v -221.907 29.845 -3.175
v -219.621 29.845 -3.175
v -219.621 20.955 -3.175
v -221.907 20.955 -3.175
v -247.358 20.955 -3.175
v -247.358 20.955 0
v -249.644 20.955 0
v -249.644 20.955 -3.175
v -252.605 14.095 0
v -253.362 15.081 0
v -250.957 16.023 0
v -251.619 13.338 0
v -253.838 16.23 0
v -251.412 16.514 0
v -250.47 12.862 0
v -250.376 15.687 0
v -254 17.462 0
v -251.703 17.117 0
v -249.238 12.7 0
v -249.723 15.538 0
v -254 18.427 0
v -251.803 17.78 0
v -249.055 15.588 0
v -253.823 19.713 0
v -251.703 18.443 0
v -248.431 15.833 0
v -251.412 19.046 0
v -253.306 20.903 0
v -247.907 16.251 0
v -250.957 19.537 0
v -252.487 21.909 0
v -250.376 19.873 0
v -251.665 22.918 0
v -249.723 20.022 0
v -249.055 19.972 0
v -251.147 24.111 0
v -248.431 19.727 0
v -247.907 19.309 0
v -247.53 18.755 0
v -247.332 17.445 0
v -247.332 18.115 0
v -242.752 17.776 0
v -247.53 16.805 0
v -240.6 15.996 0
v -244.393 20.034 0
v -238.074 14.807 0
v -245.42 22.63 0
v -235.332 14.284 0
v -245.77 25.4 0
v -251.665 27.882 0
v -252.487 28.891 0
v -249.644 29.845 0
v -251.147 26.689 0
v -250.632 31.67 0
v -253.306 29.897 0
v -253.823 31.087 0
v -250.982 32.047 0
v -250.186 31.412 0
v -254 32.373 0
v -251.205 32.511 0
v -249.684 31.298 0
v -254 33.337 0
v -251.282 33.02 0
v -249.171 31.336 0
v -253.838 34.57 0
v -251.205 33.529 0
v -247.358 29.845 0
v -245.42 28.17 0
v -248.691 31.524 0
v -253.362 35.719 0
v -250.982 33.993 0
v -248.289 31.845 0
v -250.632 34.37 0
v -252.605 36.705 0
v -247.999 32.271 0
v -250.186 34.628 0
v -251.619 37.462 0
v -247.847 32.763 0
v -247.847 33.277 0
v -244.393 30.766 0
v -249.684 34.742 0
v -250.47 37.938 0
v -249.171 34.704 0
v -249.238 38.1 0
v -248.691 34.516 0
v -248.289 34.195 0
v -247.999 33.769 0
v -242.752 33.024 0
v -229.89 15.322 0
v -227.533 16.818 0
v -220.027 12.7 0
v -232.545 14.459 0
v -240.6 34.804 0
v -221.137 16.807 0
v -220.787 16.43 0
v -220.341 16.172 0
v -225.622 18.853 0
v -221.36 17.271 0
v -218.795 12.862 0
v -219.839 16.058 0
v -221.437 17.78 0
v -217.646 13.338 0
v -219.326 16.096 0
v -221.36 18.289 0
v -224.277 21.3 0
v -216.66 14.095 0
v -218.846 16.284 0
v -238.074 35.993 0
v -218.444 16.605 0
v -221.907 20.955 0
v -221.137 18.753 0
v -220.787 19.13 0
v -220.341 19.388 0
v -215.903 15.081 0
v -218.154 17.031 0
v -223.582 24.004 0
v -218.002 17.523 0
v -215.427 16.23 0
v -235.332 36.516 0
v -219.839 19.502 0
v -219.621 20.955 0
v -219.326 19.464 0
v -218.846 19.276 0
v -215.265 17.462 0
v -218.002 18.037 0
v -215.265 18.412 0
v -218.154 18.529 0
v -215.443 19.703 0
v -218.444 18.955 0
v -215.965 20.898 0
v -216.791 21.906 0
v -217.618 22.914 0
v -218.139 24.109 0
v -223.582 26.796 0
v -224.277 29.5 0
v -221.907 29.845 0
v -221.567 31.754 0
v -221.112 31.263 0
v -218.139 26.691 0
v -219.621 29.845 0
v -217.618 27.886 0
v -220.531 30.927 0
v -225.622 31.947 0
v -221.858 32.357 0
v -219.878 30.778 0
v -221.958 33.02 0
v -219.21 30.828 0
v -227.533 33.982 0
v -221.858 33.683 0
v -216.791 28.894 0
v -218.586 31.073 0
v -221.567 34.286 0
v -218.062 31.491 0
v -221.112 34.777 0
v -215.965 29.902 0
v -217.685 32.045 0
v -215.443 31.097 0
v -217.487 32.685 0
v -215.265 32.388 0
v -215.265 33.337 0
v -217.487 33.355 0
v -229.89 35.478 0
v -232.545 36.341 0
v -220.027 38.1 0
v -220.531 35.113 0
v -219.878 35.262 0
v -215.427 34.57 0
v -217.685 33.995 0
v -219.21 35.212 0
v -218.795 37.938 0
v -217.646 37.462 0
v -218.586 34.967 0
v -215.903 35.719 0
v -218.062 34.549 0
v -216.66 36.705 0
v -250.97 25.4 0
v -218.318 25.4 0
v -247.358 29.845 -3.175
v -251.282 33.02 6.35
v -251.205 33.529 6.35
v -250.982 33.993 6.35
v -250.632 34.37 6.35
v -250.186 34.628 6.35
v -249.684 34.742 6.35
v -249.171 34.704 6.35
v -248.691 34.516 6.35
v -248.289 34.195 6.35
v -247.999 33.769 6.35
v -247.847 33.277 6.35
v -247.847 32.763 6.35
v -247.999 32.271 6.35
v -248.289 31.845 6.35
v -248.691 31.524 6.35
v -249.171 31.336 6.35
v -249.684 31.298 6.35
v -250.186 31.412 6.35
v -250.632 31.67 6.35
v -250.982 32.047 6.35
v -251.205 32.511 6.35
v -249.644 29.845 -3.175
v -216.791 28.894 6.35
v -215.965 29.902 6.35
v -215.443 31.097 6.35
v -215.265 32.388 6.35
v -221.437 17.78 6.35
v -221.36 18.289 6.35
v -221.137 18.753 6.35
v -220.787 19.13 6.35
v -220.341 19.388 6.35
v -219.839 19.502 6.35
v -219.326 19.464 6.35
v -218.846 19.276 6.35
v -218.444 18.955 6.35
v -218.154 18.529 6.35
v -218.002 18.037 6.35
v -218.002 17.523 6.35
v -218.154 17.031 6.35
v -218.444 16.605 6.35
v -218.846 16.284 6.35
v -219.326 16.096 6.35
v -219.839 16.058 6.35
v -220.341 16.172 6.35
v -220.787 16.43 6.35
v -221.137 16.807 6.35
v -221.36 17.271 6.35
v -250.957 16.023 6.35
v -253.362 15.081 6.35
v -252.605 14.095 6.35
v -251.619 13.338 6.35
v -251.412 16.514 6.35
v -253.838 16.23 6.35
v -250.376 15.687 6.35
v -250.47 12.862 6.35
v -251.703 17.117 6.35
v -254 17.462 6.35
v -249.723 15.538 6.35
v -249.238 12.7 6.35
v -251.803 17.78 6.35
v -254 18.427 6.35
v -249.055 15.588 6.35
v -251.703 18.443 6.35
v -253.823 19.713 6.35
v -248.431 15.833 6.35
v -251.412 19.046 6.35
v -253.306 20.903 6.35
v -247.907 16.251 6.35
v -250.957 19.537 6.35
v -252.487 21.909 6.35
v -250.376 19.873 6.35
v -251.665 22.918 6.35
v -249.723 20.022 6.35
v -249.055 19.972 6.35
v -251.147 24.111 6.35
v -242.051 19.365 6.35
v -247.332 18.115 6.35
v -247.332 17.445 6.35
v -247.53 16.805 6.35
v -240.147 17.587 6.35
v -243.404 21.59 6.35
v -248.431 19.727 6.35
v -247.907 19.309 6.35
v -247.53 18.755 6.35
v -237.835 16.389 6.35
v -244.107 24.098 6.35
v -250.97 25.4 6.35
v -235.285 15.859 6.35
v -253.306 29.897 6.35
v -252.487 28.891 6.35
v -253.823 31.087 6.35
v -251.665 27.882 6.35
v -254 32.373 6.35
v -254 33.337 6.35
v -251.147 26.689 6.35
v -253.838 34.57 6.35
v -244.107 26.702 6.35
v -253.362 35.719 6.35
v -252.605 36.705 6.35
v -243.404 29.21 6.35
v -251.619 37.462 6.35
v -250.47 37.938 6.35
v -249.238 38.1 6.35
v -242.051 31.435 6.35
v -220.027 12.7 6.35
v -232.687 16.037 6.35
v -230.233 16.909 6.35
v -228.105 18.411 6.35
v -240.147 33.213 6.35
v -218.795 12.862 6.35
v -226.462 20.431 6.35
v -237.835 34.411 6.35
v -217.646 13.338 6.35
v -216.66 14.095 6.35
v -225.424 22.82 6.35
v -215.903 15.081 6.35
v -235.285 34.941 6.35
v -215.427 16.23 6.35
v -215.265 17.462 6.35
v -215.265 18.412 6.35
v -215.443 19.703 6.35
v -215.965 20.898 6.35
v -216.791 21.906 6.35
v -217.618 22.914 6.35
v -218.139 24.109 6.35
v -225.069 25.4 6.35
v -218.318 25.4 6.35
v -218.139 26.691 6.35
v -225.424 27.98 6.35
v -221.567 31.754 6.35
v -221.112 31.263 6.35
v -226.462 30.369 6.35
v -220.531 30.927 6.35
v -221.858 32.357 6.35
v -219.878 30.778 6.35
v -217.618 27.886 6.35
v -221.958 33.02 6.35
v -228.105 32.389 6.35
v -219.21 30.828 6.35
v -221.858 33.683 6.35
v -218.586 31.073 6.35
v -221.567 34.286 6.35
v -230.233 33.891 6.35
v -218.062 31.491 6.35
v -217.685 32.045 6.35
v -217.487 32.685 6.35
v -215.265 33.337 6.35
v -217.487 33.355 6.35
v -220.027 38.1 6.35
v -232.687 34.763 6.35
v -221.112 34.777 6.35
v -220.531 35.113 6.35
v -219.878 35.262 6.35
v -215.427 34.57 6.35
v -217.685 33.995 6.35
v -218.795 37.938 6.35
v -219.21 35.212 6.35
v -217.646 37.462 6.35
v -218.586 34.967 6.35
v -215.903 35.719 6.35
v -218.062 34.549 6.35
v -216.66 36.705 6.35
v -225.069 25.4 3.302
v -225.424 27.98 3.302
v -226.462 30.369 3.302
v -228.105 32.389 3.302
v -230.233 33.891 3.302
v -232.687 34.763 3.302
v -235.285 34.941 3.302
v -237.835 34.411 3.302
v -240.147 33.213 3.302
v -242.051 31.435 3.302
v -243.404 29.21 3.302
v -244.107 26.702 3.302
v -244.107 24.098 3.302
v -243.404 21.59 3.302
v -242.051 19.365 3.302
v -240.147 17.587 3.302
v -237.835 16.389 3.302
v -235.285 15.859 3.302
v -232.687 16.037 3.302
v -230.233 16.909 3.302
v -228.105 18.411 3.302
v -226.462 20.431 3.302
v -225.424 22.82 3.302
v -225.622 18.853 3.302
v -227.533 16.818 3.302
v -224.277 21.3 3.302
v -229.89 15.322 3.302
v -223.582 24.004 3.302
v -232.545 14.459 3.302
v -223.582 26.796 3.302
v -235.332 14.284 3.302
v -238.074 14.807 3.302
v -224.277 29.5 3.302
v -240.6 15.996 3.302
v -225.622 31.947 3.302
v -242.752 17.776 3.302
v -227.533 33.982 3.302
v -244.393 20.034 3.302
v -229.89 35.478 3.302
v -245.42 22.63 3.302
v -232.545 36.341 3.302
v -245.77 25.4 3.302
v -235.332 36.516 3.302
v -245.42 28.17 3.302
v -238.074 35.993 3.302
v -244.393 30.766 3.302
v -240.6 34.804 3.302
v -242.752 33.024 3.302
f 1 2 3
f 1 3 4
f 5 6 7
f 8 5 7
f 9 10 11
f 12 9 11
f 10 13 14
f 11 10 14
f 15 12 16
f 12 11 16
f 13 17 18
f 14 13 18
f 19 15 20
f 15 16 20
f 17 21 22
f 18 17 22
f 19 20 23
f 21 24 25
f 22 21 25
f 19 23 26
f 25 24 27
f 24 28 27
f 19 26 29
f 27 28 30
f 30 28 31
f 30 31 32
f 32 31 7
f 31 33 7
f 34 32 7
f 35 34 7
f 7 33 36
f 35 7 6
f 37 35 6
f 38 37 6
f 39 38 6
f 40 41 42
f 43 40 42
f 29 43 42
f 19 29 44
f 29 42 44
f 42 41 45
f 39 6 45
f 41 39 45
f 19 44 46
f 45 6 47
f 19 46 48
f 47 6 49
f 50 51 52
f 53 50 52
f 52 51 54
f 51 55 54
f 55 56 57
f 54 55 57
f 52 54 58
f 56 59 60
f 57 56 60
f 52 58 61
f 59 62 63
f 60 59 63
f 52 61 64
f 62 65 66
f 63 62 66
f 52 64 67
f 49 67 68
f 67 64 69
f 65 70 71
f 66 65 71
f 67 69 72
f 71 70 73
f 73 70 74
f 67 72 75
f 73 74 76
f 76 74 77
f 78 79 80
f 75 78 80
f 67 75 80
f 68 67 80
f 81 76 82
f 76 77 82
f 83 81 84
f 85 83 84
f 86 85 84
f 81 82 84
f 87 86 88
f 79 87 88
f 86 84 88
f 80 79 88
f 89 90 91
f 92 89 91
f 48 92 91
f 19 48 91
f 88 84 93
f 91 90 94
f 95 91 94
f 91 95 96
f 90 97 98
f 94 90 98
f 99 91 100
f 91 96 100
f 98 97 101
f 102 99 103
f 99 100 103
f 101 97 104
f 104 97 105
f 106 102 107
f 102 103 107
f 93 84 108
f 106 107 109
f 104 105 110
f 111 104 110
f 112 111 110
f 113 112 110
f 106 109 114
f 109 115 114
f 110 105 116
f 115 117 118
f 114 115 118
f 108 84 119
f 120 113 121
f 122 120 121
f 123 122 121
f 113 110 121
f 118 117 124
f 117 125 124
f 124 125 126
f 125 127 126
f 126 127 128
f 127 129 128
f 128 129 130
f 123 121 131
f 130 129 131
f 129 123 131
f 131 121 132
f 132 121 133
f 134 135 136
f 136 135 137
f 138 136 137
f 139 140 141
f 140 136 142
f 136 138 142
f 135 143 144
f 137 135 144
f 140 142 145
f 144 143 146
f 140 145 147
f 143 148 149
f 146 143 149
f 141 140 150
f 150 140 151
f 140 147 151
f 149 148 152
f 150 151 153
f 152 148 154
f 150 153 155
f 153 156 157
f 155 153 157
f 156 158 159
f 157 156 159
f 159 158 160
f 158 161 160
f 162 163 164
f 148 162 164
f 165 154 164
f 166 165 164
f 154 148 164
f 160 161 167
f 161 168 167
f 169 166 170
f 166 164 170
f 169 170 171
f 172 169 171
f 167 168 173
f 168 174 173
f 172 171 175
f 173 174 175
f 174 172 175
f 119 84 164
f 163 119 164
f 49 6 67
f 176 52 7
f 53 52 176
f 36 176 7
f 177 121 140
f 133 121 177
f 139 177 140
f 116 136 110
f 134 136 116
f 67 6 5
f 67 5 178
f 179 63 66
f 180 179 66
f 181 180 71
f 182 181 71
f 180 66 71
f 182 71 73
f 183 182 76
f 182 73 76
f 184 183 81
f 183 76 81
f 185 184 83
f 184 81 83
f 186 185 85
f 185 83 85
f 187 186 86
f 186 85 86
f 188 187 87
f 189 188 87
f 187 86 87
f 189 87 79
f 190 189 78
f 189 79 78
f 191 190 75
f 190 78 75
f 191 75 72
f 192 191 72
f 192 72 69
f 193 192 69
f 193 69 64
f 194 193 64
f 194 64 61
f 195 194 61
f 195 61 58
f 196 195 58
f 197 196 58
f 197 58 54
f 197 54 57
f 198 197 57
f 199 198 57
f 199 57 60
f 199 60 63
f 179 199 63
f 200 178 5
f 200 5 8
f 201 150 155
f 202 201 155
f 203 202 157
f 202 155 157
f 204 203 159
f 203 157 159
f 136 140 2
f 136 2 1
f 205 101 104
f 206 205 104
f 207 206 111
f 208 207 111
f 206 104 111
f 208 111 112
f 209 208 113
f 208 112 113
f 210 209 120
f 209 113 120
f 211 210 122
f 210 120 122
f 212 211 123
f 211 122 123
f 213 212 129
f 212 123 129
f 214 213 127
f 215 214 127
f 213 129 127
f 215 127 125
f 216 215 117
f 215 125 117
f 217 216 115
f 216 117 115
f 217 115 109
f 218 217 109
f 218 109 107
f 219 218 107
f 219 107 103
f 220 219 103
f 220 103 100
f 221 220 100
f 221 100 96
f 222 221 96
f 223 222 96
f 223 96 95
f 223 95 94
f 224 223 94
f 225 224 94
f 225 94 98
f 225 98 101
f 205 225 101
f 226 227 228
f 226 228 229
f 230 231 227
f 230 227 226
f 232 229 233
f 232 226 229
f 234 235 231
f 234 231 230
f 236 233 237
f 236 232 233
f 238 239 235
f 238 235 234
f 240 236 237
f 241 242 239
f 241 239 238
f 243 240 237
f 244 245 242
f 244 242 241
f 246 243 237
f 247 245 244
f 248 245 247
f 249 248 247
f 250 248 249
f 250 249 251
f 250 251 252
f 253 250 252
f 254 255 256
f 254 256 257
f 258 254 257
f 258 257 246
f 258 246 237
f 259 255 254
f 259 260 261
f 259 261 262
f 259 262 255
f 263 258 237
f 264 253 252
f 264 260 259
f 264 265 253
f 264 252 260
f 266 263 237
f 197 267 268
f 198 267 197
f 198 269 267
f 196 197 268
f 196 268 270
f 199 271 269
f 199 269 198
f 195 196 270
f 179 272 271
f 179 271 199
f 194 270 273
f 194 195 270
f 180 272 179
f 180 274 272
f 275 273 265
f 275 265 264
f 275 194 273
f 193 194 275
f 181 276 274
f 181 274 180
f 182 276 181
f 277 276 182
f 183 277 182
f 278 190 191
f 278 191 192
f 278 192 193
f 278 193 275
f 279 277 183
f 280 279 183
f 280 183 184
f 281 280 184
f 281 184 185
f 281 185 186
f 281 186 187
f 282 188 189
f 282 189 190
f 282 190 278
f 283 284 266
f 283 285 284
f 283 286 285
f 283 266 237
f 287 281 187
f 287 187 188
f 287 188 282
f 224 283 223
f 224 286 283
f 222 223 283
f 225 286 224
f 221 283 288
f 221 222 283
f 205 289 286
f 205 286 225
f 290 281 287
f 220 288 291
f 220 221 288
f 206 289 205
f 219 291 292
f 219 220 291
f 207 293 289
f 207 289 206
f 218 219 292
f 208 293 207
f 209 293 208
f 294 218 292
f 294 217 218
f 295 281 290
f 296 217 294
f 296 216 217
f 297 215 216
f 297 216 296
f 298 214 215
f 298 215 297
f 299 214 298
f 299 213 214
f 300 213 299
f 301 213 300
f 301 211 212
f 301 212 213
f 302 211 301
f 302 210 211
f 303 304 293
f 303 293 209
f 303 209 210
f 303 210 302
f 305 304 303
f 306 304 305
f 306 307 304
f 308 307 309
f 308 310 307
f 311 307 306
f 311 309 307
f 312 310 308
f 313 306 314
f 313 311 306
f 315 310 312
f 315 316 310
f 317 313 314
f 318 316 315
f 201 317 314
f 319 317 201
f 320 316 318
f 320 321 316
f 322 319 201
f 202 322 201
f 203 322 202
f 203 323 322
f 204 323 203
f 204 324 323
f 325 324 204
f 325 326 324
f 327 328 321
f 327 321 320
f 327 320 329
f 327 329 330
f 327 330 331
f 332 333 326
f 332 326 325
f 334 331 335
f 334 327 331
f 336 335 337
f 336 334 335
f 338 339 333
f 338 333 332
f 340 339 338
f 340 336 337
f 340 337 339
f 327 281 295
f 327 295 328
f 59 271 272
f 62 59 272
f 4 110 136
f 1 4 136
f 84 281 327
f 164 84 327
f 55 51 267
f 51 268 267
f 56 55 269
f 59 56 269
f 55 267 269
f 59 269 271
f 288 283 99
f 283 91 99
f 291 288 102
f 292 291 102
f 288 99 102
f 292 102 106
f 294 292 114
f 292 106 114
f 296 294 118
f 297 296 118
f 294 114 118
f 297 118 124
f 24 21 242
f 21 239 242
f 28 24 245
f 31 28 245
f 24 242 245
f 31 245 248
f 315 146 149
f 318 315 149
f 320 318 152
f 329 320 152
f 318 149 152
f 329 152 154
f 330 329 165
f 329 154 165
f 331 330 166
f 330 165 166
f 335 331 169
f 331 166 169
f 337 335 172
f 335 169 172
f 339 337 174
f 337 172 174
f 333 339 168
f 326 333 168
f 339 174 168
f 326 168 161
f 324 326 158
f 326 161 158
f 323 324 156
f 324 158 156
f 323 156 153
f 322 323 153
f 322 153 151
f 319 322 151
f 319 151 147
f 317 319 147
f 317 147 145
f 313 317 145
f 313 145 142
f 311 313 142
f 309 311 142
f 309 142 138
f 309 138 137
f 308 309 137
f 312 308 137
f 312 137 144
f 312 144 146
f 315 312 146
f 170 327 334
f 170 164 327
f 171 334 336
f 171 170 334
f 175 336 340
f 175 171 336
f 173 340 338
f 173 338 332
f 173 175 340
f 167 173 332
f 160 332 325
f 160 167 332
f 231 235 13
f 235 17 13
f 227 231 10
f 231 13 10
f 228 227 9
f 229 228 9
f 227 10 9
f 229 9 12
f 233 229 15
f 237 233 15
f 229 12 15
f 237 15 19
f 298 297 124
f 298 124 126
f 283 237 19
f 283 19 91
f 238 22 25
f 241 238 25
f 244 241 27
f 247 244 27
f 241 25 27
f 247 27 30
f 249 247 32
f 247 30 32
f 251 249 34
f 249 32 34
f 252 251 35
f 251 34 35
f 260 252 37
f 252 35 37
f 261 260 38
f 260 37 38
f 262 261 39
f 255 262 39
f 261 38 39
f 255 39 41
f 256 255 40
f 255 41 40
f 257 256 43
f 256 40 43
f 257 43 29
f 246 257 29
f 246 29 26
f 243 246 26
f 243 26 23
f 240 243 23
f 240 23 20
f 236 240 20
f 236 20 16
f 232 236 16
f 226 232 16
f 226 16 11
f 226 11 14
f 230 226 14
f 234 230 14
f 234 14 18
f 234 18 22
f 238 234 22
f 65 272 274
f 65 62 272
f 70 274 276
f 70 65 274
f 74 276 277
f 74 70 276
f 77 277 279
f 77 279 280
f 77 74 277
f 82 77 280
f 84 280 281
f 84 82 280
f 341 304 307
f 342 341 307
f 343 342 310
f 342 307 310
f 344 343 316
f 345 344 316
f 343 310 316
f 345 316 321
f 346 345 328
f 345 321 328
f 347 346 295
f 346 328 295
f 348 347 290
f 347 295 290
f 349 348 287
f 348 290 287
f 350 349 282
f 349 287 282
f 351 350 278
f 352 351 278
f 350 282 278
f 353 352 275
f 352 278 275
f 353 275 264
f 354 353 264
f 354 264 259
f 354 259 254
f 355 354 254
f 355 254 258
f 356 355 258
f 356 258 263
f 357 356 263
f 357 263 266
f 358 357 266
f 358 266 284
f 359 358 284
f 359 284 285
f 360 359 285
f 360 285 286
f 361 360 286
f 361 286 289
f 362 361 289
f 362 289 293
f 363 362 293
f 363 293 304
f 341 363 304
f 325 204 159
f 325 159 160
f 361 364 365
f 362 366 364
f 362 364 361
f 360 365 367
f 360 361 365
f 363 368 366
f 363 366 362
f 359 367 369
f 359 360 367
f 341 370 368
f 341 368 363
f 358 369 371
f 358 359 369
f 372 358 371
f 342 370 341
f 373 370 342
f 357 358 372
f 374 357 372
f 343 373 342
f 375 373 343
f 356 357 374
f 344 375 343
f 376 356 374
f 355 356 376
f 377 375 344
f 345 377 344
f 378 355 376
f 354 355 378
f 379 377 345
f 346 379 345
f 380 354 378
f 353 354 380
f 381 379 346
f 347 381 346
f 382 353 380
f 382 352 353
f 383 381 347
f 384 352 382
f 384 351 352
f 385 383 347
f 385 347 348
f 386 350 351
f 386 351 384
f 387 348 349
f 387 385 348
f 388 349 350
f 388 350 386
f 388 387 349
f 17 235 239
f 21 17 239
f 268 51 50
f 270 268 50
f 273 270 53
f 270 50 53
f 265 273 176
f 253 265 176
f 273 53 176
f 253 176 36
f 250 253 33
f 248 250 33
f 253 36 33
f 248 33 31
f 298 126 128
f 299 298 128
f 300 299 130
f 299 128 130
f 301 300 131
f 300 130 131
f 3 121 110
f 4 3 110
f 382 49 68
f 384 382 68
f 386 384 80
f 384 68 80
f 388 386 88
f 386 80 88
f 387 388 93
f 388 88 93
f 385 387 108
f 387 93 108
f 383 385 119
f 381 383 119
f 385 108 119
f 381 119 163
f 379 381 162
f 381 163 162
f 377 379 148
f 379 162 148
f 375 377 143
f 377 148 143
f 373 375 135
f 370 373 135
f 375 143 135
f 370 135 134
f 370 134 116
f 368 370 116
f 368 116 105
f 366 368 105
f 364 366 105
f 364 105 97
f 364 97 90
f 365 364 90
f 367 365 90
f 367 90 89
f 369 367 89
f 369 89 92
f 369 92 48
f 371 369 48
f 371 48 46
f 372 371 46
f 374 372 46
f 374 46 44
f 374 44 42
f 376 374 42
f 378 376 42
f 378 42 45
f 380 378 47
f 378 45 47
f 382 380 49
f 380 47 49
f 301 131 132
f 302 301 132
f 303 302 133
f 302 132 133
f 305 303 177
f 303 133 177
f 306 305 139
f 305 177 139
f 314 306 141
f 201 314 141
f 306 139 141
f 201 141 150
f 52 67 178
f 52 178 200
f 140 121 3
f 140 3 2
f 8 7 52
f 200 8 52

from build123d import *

# Parameters (mm, degrees)
SKETCH1_W                       = 38.735
SKETCH1_H                       = 25.4
BOSS_EXTRUDE1_DEPTH             = 6.35
CUT_EXTRUDE1_DEPTH              = 7.35
CUT_EXTRUDE2_DEPTH              = 7.35
SKETCH4_W                       = 2.286
SKETCH4_H                       = 8.89
BOSS_EXTRUDE2_DEPTH             = 3.175
SKETCH5_W                       = 2.286
SKETCH5_H                       = 8.89
BOSS_EXTRUDE3_DEPTH             = 3.175
HOLE1_D                         = 19.1262
HOLE1_DEPTH                     = 6.35
HOLE1_CBORE_D                   = 22.2758
HOLE1_CBORE_DEPTH               = 3.302
F_16_0_177_DIAMETER_HOLE1_D     = 4.4958
F_16_0_177_DIAMETER_HOLE1_DEPTH = 9.525
F_29_0_136_DIAMETER_HOLE1_D     = 3.4544
F_29_0_136_DIAMETER_HOLE1_DEPTH = 9.525
FILLET1_R                       = 4.7625


with BuildPart() as part:
    # Sketch1 → Boss-Extrude1 (new body)
    with BuildSketch(Plane.XY.offset(6.35)):
        with Locations((-234.6325, 25.4)):
            Rectangle(SKETCH1_W, SKETCH1_H)
    extrude(amount=-BOSS_EXTRUDE1_DEPTH)

    # Sketch2 → Cut-Extrude1 (cut, through all)
    with BuildSketch(Plane(origin=(0, 0, 0), x_dir=(-1, 0, 0), z_dir=(0, 0, -1))):
        with BuildLine():
            Line((215.265, 32.388210744), (215.265, 18.411789256))
            ThreePointArc((215.265, 18.411789256), (215.6632391, 20.318260617), (216.791355087, 21.905894628))
            ThreePointArc((216.791355087, 21.905894628), (218.317710174, 25.4), (216.791355087, 28.894105372))
            ThreePointArc((216.791355087, 28.894105372), (215.6632391, 30.481739383), (215.265, 32.388210744))
        make_face()
    extrude(amount=-CUT_EXTRUDE1_DEPTH, mode=Mode.SUBTRACT)

    # Sketch3 → Cut-Extrude2 (cut, through all)
    with BuildSketch(Plane(origin=(0, 0, 0), x_dir=(-1, 0, 0), z_dir=(0, 0, -1))):
        with BuildLine():
            Line((254, 20.955), (254, 29.845))
            ThreePointArc((254, 29.845), (250.969652441, 25.4), (254, 20.955))
        make_face()
    extrude(amount=-CUT_EXTRUDE2_DEPTH, mode=Mode.SUBTRACT)

    # Sketch4 → Boss-Extrude2 (add)
    with BuildSketch(Plane(origin=(0, 0, 0), x_dir=(-1, 0, 0), z_dir=(0, 0, -1))):
        with Locations((220.7641, 25.4)):
            Rectangle(SKETCH4_W, SKETCH4_H)
    extrude(amount=BOSS_EXTRUDE2_DEPTH)

    # Sketch5 → Boss-Extrude3 (add)
    with BuildSketch(Plane(origin=(0, 0, 0), x_dir=(-1, 0, 0), z_dir=(0, 0, -1))):
        with Locations((248.5009, 25.4)):
            Rectangle(SKETCH5_W, SKETCH5_H)
    extrude(amount=BOSS_EXTRUDE3_DEPTH)

    # Hole1
    with Locations(Plane(origin=(0, 0, 0), x_dir=(-1, 0, 0), z_dir=(0, 0, -1))):
        with Locations((234.6325, 25.4)):
            CounterBoreHole(HOLE1_D / 2, HOLE1_CBORE_D / 2, HOLE1_CBORE_DEPTH, depth=HOLE1_DEPTH)

    # #16 (0.177) Diameter Hole1
    with Locations(Plane.XY.offset(6.35)):
        with Locations((-249.555, 17.78), (-219.71, 33.02)):
            Hole(F_16_0_177_DIAMETER_HOLE1_D / 2, depth=F_16_0_177_DIAMETER_HOLE1_DEPTH)

    # #29 (0.136) Diameter Hole1
    with Locations(Plane.XY.offset(6.35)):
        with Locations((-219.71, 17.78), (-249.555, 33.02)):
            Hole(F_29_0_136_DIAMETER_HOLE1_D / 2, depth=F_29_0_136_DIAMETER_HOLE1_DEPTH)

    # Fillet1
    fillet1_edges = [part.edges().sort_by_distance(p)[0] for p in [
        (-254, 20.955, 3.175),
        (-254, 29.845, 3.175),
        (-254, 38.1, 3.175),
        (-215.265, 38.1, 3.175),
        (-215.265, 12.7, 3.175),
        (-254, 12.7, 3.175),
    ]]
    fillet(fillet1_edges, radius=FILLET1_R)


solid = part.part
